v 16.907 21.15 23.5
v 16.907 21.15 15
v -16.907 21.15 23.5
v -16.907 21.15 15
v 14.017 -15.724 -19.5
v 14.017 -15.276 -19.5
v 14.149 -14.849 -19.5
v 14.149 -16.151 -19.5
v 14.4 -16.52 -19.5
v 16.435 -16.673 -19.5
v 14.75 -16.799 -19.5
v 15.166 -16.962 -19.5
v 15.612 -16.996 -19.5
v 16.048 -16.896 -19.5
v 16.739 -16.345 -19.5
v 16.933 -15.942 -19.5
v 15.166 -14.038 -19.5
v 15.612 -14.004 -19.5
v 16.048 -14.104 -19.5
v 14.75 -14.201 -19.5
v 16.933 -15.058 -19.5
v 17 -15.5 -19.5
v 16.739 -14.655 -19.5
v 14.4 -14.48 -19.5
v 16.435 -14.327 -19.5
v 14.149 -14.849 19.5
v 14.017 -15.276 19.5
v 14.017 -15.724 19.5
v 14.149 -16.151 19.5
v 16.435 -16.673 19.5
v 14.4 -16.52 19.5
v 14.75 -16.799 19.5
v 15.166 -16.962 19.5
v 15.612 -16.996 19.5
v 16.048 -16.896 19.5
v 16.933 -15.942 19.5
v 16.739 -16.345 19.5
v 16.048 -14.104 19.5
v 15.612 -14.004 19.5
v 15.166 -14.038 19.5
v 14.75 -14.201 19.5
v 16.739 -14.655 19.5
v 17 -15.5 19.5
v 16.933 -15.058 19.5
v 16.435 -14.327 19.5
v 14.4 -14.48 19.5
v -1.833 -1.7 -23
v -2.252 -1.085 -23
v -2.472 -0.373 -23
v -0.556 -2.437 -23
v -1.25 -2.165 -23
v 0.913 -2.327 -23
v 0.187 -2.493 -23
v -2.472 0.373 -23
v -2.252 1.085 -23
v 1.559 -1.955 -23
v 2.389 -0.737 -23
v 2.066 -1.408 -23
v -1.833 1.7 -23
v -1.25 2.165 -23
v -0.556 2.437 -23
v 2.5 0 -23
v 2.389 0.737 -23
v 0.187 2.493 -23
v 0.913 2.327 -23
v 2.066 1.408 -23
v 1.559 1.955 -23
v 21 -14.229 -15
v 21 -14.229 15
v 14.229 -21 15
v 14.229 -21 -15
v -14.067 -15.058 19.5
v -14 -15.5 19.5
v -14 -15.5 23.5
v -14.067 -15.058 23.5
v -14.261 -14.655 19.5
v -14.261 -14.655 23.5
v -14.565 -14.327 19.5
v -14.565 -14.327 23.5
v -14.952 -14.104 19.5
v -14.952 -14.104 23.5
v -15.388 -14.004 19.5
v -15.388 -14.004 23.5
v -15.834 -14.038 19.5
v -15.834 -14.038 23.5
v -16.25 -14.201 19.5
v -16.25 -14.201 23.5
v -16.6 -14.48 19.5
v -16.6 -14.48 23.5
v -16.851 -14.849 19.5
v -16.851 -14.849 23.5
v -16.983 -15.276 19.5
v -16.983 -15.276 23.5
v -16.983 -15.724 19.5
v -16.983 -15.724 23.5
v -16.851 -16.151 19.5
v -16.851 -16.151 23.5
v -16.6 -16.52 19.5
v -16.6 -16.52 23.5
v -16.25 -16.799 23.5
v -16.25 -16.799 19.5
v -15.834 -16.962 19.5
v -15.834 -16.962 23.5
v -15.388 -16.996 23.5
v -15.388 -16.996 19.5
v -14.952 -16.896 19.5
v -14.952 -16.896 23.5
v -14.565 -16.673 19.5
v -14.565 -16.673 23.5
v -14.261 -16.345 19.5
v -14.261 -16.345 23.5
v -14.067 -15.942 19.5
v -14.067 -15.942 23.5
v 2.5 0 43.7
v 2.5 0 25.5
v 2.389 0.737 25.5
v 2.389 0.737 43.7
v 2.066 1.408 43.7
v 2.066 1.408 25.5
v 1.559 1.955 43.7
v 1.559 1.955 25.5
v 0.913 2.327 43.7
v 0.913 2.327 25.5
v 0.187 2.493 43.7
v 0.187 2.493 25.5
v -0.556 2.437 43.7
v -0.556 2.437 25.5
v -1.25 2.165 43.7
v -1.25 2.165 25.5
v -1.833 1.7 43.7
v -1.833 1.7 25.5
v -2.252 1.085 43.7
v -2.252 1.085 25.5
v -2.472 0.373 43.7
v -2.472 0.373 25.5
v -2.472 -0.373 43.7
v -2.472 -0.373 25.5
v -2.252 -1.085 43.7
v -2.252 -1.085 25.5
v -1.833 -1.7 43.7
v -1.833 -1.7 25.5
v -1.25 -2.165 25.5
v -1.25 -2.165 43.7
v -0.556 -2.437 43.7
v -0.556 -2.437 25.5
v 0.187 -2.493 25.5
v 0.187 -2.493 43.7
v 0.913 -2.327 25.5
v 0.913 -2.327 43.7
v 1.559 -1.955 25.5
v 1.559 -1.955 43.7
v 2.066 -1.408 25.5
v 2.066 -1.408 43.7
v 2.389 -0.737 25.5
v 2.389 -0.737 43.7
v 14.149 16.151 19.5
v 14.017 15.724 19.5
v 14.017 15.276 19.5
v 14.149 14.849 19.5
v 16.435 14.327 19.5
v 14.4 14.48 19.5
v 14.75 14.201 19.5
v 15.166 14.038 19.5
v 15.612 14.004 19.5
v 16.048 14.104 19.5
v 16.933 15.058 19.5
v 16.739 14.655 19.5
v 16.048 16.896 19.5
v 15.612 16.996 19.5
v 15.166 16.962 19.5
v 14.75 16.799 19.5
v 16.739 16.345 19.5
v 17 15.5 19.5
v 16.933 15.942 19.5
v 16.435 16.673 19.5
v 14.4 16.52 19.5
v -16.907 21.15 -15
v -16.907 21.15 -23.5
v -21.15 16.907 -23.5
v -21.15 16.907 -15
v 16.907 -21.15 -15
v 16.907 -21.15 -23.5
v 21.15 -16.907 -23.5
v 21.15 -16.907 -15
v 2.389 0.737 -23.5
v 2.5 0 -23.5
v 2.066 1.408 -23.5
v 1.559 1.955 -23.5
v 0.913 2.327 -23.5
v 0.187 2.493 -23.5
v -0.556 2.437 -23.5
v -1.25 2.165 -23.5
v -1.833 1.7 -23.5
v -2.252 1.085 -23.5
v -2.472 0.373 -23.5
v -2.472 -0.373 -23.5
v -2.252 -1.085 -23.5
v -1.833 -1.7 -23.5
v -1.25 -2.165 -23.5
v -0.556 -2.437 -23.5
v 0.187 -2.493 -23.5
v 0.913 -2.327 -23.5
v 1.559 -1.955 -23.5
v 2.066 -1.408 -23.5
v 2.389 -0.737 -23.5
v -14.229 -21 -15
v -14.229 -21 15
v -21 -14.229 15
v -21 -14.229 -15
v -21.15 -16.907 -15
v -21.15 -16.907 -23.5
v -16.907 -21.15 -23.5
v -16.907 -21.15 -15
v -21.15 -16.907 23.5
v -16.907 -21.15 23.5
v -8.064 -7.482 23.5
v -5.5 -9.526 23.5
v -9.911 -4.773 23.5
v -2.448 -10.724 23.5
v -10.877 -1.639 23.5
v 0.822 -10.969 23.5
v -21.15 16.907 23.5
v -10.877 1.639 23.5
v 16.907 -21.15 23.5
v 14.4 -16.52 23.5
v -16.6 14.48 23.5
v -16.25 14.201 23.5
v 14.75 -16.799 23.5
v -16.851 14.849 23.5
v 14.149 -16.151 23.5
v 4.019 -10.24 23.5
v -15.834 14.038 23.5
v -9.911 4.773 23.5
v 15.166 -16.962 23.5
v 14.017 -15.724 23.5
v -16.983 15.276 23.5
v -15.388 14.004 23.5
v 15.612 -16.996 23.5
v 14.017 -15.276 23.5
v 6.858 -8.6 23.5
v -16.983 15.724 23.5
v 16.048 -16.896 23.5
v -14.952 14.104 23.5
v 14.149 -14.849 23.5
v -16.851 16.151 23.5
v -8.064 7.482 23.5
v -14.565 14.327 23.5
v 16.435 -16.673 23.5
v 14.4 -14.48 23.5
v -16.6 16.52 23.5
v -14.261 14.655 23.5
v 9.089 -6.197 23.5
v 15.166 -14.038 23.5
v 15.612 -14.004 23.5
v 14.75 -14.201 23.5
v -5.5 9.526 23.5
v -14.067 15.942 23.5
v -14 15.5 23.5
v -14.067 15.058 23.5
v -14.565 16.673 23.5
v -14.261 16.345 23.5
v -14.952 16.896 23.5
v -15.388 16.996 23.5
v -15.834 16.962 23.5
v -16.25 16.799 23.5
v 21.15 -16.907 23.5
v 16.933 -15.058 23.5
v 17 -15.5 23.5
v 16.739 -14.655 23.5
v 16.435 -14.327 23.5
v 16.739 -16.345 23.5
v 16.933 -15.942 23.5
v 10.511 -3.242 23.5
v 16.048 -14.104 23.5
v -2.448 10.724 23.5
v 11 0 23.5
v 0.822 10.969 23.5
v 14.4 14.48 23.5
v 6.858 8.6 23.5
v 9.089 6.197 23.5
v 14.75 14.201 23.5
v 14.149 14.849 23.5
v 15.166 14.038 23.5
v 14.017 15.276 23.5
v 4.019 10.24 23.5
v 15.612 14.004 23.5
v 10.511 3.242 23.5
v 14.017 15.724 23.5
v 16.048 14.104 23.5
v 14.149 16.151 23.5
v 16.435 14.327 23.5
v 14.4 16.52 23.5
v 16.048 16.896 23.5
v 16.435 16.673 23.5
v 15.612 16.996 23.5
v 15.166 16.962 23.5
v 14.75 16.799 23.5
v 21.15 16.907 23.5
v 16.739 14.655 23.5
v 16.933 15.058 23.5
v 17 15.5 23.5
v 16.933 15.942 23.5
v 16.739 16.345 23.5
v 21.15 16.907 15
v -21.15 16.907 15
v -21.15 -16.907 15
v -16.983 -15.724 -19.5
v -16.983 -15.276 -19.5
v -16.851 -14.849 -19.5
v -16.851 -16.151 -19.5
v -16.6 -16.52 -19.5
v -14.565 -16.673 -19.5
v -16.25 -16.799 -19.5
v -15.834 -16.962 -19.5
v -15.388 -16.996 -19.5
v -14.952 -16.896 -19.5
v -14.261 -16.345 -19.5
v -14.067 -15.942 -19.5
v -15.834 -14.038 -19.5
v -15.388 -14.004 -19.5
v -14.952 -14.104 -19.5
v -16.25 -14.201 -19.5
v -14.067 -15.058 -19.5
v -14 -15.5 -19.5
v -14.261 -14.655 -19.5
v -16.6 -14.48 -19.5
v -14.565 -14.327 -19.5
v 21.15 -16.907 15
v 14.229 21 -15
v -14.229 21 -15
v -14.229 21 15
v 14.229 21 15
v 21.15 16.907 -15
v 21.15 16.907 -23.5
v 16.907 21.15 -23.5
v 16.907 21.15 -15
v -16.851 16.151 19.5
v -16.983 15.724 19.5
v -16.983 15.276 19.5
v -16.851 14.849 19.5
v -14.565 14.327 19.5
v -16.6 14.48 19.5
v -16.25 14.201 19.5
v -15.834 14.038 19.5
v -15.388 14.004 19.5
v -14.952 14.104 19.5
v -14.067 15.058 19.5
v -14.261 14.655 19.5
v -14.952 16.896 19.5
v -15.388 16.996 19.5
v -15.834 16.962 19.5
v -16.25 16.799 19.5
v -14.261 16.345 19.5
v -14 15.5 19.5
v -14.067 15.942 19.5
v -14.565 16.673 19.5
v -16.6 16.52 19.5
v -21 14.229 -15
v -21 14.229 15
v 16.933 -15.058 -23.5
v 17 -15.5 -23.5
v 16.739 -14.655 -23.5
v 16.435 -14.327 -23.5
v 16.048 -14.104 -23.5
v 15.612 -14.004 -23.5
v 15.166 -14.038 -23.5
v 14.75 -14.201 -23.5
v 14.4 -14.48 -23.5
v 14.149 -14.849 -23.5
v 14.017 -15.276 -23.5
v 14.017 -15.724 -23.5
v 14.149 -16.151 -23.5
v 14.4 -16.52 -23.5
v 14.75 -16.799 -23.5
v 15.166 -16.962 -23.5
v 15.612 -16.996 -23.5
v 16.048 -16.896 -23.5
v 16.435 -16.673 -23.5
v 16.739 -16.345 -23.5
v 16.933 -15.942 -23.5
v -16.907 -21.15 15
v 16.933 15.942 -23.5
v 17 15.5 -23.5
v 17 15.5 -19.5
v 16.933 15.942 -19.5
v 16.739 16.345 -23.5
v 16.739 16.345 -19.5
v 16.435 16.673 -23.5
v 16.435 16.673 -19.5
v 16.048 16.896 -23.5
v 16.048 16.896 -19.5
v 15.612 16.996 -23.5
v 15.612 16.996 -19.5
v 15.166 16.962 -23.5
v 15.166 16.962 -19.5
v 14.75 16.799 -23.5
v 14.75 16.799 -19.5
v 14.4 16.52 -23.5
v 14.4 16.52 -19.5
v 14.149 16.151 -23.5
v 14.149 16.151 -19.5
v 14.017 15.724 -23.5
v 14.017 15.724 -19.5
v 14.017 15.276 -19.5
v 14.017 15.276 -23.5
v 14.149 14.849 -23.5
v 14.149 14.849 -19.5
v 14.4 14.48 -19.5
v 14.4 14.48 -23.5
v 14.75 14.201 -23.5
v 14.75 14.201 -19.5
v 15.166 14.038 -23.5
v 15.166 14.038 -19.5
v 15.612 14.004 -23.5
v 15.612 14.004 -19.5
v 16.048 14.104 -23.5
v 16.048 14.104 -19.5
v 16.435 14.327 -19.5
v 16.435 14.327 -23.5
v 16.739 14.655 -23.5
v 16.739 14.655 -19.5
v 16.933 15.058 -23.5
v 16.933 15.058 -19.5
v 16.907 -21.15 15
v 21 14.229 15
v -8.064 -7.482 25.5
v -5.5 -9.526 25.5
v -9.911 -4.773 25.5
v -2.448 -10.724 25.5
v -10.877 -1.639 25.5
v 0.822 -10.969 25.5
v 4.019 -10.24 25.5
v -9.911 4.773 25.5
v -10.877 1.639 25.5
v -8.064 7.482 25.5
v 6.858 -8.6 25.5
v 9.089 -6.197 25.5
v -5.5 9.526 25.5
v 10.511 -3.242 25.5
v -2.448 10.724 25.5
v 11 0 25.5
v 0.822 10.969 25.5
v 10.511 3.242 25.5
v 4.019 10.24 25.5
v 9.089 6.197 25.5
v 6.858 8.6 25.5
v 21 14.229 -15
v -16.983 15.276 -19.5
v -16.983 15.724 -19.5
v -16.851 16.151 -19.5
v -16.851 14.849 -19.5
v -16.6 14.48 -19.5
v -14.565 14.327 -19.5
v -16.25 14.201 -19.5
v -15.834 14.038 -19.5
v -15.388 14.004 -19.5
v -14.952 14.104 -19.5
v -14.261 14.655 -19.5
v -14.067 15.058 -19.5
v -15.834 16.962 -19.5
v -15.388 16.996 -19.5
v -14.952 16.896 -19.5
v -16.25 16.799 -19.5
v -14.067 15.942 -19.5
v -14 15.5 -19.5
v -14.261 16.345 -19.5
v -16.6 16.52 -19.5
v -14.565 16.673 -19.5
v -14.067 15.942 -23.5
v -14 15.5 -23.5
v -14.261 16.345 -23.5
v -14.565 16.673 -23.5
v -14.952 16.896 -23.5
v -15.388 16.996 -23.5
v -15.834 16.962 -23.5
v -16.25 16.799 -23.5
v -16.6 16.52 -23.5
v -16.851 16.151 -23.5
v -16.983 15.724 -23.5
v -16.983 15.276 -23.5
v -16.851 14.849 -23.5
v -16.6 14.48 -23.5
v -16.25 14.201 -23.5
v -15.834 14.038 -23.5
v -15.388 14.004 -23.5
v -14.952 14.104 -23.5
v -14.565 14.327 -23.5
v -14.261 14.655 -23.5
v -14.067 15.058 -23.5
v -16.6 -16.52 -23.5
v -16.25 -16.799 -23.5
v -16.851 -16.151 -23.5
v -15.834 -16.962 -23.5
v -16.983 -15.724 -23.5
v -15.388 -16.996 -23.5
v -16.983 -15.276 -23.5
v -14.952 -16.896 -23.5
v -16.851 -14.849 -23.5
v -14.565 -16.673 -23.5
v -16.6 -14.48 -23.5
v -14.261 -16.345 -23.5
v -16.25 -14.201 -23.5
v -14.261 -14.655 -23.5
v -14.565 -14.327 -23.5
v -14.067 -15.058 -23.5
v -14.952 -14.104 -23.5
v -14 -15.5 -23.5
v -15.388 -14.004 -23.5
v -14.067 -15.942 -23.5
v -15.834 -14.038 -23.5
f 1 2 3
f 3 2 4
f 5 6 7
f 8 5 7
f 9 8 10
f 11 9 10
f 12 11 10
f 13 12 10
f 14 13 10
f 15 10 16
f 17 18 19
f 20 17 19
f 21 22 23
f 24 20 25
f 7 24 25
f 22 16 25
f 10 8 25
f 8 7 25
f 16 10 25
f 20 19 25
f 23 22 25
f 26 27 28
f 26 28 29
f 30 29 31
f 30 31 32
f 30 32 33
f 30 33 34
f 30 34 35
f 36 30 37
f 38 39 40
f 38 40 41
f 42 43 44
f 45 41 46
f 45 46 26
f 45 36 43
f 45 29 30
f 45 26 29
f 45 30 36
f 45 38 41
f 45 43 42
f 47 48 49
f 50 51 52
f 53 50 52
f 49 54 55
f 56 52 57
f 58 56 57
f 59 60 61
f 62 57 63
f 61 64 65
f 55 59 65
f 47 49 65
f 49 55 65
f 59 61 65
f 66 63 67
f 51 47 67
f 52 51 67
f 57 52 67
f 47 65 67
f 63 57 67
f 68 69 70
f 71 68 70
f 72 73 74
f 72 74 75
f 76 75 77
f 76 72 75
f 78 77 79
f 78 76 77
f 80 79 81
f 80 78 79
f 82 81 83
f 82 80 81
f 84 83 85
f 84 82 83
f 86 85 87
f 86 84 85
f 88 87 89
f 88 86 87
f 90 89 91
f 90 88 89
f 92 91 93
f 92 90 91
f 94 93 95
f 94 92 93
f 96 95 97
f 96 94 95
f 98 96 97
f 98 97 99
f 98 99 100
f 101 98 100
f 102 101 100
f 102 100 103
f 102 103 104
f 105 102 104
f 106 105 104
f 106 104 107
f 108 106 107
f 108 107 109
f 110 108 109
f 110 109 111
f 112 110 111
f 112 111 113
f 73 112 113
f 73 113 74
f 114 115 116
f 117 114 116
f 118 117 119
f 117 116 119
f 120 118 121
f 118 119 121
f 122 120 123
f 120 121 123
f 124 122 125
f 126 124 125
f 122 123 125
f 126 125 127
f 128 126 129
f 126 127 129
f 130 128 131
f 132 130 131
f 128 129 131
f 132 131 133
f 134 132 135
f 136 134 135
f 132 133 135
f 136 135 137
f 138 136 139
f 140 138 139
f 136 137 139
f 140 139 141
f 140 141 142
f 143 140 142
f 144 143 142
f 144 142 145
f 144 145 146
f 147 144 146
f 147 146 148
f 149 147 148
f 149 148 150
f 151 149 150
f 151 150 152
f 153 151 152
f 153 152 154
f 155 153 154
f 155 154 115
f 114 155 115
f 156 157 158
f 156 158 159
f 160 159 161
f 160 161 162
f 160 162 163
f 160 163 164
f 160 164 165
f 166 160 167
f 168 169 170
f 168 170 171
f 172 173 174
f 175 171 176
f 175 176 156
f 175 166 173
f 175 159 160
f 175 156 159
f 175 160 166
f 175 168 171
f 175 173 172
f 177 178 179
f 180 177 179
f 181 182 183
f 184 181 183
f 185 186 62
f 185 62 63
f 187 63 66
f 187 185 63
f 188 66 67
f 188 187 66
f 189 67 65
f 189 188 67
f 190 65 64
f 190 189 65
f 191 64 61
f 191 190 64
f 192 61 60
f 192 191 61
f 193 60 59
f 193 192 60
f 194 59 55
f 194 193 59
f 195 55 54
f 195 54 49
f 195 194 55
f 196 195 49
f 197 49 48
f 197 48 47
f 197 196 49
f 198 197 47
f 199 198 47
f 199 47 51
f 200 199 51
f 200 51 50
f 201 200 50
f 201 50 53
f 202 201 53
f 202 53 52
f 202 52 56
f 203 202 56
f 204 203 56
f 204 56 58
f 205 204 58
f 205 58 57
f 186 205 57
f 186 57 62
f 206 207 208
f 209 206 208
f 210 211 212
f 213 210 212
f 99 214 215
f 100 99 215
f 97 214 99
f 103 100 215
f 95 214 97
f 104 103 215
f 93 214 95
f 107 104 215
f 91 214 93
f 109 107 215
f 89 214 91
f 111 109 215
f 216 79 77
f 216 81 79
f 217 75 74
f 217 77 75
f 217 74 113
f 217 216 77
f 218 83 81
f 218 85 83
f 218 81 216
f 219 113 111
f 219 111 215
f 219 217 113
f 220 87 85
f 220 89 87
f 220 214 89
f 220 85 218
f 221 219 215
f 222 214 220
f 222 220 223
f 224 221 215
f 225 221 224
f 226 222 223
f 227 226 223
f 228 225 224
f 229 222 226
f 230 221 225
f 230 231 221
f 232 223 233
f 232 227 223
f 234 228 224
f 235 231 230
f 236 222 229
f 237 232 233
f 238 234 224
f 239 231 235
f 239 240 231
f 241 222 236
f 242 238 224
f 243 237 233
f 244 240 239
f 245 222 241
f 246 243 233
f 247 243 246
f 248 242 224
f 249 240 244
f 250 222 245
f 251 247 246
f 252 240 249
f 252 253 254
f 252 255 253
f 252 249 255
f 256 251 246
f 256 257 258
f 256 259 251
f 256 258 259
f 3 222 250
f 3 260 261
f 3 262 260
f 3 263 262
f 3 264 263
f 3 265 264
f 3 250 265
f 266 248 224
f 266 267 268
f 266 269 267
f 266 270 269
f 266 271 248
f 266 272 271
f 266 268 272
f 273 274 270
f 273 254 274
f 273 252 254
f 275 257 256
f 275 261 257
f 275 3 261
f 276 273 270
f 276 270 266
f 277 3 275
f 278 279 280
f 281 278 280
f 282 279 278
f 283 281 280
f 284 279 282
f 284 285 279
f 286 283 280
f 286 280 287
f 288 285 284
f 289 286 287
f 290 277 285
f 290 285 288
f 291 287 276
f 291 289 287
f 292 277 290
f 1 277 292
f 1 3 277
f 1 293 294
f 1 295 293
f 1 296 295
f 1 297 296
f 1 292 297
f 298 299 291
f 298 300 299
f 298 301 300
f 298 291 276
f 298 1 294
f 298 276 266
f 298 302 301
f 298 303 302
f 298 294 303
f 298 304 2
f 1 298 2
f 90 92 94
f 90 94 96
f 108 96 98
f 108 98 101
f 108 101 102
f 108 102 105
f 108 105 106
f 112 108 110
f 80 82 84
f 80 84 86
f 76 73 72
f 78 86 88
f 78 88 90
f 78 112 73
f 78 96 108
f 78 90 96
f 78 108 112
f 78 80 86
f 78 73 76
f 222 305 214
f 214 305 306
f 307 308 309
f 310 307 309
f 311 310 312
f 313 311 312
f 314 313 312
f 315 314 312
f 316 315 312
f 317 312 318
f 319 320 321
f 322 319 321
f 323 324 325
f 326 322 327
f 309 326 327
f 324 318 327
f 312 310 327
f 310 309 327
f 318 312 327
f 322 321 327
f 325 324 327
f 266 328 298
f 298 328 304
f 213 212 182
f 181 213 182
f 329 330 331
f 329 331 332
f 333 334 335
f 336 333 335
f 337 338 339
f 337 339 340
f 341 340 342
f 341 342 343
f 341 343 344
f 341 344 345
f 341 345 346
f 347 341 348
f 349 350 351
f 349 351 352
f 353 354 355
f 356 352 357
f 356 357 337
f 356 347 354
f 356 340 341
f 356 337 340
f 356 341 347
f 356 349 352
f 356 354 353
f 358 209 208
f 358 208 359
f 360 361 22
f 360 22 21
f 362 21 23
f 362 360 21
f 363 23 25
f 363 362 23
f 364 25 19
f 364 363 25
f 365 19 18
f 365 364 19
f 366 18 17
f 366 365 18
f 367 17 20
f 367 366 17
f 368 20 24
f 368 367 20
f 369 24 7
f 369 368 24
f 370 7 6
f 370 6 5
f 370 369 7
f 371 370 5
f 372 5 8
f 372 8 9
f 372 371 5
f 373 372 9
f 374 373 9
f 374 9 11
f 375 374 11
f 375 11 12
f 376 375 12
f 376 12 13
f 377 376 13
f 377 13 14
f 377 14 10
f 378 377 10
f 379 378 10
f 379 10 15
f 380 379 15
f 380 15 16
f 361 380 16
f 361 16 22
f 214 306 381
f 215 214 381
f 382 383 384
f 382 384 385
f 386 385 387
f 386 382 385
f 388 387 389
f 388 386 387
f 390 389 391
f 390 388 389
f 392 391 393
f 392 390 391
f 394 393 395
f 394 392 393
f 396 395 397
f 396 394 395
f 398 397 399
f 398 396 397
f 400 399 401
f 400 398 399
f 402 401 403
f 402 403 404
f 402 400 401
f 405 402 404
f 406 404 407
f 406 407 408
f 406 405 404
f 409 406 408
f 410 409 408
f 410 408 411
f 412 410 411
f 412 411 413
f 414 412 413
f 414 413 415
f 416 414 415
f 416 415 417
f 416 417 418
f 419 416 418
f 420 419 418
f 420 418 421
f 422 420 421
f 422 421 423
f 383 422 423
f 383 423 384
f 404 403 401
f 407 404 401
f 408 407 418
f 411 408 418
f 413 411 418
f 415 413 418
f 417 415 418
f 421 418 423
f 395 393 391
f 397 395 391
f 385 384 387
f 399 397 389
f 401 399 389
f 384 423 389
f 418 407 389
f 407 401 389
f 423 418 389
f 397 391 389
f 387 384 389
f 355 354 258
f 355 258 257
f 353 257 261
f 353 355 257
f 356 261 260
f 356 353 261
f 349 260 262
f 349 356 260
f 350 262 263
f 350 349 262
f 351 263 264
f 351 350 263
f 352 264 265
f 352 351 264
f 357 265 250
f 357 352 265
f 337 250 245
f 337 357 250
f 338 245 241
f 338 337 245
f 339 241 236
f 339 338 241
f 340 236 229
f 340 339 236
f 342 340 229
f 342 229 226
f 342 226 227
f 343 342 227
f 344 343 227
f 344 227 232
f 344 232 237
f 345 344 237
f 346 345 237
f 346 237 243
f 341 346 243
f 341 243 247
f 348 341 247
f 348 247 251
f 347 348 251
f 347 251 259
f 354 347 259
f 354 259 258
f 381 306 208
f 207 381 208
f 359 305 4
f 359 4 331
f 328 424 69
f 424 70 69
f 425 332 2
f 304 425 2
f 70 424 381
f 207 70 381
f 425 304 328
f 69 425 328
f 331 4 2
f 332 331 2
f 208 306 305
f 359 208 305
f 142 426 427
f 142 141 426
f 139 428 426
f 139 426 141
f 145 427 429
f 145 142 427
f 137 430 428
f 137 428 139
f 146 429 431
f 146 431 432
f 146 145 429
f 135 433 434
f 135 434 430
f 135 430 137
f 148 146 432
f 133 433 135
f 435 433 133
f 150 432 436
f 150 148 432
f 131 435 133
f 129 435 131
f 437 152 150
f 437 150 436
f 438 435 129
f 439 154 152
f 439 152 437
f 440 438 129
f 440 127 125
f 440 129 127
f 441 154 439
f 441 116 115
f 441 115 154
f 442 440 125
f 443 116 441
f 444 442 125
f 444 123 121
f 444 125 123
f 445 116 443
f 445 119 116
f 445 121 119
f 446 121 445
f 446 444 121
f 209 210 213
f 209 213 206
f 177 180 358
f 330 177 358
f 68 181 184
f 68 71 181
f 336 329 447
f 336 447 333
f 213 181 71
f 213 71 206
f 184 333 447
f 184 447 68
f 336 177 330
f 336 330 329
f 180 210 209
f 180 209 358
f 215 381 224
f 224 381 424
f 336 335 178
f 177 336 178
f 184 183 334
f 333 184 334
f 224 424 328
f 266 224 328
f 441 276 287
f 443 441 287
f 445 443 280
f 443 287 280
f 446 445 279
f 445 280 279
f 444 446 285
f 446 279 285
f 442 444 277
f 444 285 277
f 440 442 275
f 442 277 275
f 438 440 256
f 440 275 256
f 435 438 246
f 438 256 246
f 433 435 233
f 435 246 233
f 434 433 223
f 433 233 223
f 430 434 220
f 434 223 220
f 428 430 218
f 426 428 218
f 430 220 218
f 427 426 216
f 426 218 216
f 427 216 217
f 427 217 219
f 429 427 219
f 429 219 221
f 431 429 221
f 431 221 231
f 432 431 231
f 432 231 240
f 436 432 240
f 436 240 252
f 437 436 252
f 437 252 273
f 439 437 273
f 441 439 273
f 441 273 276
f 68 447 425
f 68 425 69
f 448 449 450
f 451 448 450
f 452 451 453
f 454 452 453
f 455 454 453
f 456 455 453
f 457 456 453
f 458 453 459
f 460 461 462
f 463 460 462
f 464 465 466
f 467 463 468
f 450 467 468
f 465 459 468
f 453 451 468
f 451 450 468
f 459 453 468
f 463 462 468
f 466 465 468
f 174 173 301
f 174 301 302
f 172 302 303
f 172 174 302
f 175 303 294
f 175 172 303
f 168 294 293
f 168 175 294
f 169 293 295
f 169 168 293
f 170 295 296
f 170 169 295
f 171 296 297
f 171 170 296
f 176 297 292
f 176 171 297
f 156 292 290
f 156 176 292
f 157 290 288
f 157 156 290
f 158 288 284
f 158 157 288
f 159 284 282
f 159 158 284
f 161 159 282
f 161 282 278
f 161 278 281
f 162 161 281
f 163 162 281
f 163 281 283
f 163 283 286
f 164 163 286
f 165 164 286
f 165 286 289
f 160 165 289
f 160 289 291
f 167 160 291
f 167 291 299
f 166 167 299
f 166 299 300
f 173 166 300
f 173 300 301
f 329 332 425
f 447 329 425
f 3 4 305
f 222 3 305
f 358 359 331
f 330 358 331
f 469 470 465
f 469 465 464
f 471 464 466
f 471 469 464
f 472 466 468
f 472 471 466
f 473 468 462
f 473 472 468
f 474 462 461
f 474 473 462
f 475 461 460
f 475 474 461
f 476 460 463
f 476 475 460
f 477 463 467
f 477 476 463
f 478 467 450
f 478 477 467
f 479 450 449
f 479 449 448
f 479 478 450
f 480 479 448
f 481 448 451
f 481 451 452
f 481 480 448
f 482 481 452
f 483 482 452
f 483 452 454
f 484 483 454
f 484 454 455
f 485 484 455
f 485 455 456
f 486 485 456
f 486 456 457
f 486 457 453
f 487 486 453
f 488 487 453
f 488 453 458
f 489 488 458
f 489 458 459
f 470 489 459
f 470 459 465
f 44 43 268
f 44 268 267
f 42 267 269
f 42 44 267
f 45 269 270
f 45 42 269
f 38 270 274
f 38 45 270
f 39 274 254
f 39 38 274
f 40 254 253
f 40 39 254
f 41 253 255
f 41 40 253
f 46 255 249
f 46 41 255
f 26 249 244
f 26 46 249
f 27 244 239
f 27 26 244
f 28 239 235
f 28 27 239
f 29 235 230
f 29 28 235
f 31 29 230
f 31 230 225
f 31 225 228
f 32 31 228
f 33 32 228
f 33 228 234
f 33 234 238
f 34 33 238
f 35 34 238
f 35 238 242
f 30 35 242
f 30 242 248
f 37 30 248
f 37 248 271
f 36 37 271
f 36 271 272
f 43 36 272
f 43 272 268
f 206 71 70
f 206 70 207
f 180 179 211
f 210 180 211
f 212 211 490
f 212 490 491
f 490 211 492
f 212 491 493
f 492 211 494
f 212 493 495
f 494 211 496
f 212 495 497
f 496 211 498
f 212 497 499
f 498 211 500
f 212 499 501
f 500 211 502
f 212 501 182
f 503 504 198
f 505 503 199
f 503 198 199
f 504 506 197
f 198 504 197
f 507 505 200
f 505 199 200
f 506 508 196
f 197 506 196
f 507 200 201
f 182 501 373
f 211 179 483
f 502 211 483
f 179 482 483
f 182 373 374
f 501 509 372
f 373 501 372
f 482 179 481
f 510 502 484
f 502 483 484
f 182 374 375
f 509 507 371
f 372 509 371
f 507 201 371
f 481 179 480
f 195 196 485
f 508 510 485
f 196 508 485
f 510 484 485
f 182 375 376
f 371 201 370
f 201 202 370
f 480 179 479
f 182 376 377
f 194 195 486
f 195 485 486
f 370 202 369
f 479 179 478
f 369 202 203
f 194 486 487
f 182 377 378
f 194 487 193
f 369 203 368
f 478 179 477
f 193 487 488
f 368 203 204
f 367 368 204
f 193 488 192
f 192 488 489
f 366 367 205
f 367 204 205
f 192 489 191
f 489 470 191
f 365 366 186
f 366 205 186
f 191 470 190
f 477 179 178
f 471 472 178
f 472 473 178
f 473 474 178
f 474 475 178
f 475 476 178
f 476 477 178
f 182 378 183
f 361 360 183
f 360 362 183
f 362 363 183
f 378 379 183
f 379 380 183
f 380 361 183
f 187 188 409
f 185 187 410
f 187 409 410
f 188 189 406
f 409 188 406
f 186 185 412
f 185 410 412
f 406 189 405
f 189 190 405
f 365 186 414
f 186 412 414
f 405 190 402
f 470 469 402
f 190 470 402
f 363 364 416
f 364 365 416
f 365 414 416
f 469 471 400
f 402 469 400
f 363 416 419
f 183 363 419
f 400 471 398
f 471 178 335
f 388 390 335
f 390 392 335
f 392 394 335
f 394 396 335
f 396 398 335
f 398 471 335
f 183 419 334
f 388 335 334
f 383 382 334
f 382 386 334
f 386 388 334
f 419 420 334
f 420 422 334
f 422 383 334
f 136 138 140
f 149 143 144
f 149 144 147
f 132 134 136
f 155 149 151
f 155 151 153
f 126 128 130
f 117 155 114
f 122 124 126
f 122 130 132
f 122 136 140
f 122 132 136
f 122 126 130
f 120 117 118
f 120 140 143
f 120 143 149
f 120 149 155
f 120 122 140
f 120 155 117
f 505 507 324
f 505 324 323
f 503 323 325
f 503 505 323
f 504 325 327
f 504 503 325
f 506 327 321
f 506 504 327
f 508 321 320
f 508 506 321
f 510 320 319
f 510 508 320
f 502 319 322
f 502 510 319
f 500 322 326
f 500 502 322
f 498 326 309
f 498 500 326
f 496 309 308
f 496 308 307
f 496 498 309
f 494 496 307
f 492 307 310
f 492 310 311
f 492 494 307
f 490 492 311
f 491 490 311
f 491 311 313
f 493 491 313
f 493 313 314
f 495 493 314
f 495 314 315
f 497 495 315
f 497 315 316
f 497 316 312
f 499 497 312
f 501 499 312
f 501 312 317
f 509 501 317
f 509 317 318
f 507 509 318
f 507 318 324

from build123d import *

# Parameters (mm, degrees)
BOSS_EXTRUDE1_DEPTH      = 23.5
BOSS_EXTRUDE1_DEPTH_BACK = 23.5
SKETCH1_R                = 11
SKETCH1_R_2              = 1.5
CUT_EXTRUDE1_DEPTH       = 15
CUT_EXTRUDE1_DEPTH_BACK  = 15
BOSS_EXTRUDE2_DEPTH      = 25.5
BOSS_EXTRUDE2_DEPTH_BACK = 23.5
SKETCH1_9_R              = 11
SKETCH1_9_R_2            = 2.5
BOSS_EXTRUDE3_DEPTH      = 43.7
BOSS_EXTRUDE3_DEPTH_BACK = 23
SKETCH1_10_R             = 2.5
BOSS_EXTRUDE4_DEPTH      = 19.5
BOSS_EXTRUDE4_DEPTH_BACK = 19.5
SKETCH1_11_R             = 1.5


with BuildPart() as part:
    # Sketch1 → Boss-Extrude1 (new, two sides: drawn at the far end of the back side and taken through both)
    with BuildSketch(Plane.XY.offset(-BOSS_EXTRUDE1_DEPTH_BACK)):
        Polygon((-16.907359313, 21.15), (-21.15, 16.907359313), (-21.15, -16.907359313), (-16.907359313, -21.15), (16.907359313, -21.15), (21.15, -16.907359313), (21.15, 16.907359313), (16.907359313, 21.15), align=None)
        Circle(SKETCH1_R, mode=Mode.SUBTRACT)
        with Locations((15.5, 15.5)):
            Circle(SKETCH1_R_2, mode=Mode.SUBTRACT)
        with Locations((-15.5, 15.5)):
            Circle(SKETCH1_R_2, mode=Mode.SUBTRACT)
        with Locations((-15.5, -15.5)):
            Circle(SKETCH1_R_2, mode=Mode.SUBTRACT)
        with Locations((15.5, -15.5)):
            Circle(SKETCH1_R_2, mode=Mode.SUBTRACT)
    extrude(amount=BOSS_EXTRUDE1_DEPTH + BOSS_EXTRUDE1_DEPTH_BACK)

    # Sketch1<8> → Cut-Extrude1 (cut, two sides: drawn at the far end of the back side and taken through both)
    with BuildSketch(Plane.XY.offset(-CUT_EXTRUDE1_DEPTH_BACK)):
        Polygon((-21, 14.228932188), (-21.15, 14.078932188), (-21.15, -14.078932188), (-21, -14.228932188), align=None)
        Polygon((-14.228932188, 21), (-17.057359313, 21), (-21, 17.057359313), (-21, 14.228932188), align=None)
        Polygon((14.078932188, 21.15), (-14.078932188, 21.15), (-14.228932188, 21), (14.228932188, 21), align=None)
        Polygon((17.057359313, 21), (14.228932188, 21), (21, 14.228932188), (21, 17.057359313), align=None)
        Polygon((21.15, 14.078932188), (21, 14.228932188), (21, -14.228932188), (21.15, -14.078932188), align=None)
        Polygon((21, -17.057359313), (21, -14.228932188), (14.228932188, -21), (17.057359313, -21), align=None)
        Polygon((14.228932188, -21), (-14.228932188, -21), (-14.078932188, -21.15), (14.078932188, -21.15), align=None)
        Polygon((17.057359313, -21), (14.228932188, -21), (14.078932188, -21.15), (16.907359313, -21.15), align=None)
        Polygon((21.15, -14.078932188), (21, -14.228932188), (21, -17.057359313), (21.15, -16.907359313), align=None)
        Polygon((16.907359313, 21.15), (14.078932188, 21.15), (14.228932188, 21), (17.057359313, 21), align=None)
        Polygon((21, 17.057359313), (21, 14.228932188), (21.15, 14.078932188), (21.15, 16.907359313), align=None)
        Polygon((-14.078932188, 21.15), (-16.907359313, 21.15), (-17.057359313, 21), (-14.228932188, 21), align=None)
        Polygon((-21, 17.057359313), (-21.15, 16.907359313), (-21.15, 14.078932188), (-21, 14.228932188), align=None)
        Polygon((-14.228932188, -21), (-21, -14.228932188), (-21, -17.057359313), (-17.057359313, -21), align=None)
        Polygon((-21, -14.228932188), (-21.15, -14.078932188), (-21.15, -16.907359313), (-21, -17.057359313), align=None)
        Polygon((-14.078932188, -21.15), (-14.228932188, -21), (-17.057359313, -21), (-16.907359313, -21.15), align=None)
    extrude(amount=CUT_EXTRUDE1_DEPTH + CUT_EXTRUDE1_DEPTH_BACK, mode=Mode.SUBTRACT)

    # Sketch1<9> → Boss-Extrude2 (add, two sides: drawn at the far end of the back side and taken through both)
    with BuildSketch(Plane.XY.offset(-BOSS_EXTRUDE2_DEPTH_BACK)):
        Circle(SKETCH1_9_R)
        Circle(SKETCH1_9_R_2, mode=Mode.SUBTRACT)
    extrude(amount=BOSS_EXTRUDE2_DEPTH + BOSS_EXTRUDE2_DEPTH_BACK)

    # Sketch1<10> → Boss-Extrude3 (add, two sides: drawn at the far end of the back side and taken through both)
    with BuildSketch(Plane.XY.offset(-BOSS_EXTRUDE3_DEPTH_BACK)):
        Circle(SKETCH1_10_R)
    extrude(amount=BOSS_EXTRUDE3_DEPTH + BOSS_EXTRUDE3_DEPTH_BACK)

    # Sketch1<11> → Boss-Extrude4 (add, two sides: drawn at the far end of the back side and taken through both)
    with BuildSketch(Plane.XY.offset(-BOSS_EXTRUDE4_DEPTH_BACK)):
        with Locations((-15.5, -15.5)):
            Circle(SKETCH1_11_R)
        with Locations((-15.5, 15.5)):
            Circle(SKETCH1_11_R)
        with Locations((15.5, 15.5)):
            Circle(SKETCH1_11_R)
        with Locations((15.5, -15.5)):
            Circle(SKETCH1_11_R)
    extrude(amount=BOSS_EXTRUDE4_DEPTH + BOSS_EXTRUDE4_DEPTH_BACK)


solid = part.part
